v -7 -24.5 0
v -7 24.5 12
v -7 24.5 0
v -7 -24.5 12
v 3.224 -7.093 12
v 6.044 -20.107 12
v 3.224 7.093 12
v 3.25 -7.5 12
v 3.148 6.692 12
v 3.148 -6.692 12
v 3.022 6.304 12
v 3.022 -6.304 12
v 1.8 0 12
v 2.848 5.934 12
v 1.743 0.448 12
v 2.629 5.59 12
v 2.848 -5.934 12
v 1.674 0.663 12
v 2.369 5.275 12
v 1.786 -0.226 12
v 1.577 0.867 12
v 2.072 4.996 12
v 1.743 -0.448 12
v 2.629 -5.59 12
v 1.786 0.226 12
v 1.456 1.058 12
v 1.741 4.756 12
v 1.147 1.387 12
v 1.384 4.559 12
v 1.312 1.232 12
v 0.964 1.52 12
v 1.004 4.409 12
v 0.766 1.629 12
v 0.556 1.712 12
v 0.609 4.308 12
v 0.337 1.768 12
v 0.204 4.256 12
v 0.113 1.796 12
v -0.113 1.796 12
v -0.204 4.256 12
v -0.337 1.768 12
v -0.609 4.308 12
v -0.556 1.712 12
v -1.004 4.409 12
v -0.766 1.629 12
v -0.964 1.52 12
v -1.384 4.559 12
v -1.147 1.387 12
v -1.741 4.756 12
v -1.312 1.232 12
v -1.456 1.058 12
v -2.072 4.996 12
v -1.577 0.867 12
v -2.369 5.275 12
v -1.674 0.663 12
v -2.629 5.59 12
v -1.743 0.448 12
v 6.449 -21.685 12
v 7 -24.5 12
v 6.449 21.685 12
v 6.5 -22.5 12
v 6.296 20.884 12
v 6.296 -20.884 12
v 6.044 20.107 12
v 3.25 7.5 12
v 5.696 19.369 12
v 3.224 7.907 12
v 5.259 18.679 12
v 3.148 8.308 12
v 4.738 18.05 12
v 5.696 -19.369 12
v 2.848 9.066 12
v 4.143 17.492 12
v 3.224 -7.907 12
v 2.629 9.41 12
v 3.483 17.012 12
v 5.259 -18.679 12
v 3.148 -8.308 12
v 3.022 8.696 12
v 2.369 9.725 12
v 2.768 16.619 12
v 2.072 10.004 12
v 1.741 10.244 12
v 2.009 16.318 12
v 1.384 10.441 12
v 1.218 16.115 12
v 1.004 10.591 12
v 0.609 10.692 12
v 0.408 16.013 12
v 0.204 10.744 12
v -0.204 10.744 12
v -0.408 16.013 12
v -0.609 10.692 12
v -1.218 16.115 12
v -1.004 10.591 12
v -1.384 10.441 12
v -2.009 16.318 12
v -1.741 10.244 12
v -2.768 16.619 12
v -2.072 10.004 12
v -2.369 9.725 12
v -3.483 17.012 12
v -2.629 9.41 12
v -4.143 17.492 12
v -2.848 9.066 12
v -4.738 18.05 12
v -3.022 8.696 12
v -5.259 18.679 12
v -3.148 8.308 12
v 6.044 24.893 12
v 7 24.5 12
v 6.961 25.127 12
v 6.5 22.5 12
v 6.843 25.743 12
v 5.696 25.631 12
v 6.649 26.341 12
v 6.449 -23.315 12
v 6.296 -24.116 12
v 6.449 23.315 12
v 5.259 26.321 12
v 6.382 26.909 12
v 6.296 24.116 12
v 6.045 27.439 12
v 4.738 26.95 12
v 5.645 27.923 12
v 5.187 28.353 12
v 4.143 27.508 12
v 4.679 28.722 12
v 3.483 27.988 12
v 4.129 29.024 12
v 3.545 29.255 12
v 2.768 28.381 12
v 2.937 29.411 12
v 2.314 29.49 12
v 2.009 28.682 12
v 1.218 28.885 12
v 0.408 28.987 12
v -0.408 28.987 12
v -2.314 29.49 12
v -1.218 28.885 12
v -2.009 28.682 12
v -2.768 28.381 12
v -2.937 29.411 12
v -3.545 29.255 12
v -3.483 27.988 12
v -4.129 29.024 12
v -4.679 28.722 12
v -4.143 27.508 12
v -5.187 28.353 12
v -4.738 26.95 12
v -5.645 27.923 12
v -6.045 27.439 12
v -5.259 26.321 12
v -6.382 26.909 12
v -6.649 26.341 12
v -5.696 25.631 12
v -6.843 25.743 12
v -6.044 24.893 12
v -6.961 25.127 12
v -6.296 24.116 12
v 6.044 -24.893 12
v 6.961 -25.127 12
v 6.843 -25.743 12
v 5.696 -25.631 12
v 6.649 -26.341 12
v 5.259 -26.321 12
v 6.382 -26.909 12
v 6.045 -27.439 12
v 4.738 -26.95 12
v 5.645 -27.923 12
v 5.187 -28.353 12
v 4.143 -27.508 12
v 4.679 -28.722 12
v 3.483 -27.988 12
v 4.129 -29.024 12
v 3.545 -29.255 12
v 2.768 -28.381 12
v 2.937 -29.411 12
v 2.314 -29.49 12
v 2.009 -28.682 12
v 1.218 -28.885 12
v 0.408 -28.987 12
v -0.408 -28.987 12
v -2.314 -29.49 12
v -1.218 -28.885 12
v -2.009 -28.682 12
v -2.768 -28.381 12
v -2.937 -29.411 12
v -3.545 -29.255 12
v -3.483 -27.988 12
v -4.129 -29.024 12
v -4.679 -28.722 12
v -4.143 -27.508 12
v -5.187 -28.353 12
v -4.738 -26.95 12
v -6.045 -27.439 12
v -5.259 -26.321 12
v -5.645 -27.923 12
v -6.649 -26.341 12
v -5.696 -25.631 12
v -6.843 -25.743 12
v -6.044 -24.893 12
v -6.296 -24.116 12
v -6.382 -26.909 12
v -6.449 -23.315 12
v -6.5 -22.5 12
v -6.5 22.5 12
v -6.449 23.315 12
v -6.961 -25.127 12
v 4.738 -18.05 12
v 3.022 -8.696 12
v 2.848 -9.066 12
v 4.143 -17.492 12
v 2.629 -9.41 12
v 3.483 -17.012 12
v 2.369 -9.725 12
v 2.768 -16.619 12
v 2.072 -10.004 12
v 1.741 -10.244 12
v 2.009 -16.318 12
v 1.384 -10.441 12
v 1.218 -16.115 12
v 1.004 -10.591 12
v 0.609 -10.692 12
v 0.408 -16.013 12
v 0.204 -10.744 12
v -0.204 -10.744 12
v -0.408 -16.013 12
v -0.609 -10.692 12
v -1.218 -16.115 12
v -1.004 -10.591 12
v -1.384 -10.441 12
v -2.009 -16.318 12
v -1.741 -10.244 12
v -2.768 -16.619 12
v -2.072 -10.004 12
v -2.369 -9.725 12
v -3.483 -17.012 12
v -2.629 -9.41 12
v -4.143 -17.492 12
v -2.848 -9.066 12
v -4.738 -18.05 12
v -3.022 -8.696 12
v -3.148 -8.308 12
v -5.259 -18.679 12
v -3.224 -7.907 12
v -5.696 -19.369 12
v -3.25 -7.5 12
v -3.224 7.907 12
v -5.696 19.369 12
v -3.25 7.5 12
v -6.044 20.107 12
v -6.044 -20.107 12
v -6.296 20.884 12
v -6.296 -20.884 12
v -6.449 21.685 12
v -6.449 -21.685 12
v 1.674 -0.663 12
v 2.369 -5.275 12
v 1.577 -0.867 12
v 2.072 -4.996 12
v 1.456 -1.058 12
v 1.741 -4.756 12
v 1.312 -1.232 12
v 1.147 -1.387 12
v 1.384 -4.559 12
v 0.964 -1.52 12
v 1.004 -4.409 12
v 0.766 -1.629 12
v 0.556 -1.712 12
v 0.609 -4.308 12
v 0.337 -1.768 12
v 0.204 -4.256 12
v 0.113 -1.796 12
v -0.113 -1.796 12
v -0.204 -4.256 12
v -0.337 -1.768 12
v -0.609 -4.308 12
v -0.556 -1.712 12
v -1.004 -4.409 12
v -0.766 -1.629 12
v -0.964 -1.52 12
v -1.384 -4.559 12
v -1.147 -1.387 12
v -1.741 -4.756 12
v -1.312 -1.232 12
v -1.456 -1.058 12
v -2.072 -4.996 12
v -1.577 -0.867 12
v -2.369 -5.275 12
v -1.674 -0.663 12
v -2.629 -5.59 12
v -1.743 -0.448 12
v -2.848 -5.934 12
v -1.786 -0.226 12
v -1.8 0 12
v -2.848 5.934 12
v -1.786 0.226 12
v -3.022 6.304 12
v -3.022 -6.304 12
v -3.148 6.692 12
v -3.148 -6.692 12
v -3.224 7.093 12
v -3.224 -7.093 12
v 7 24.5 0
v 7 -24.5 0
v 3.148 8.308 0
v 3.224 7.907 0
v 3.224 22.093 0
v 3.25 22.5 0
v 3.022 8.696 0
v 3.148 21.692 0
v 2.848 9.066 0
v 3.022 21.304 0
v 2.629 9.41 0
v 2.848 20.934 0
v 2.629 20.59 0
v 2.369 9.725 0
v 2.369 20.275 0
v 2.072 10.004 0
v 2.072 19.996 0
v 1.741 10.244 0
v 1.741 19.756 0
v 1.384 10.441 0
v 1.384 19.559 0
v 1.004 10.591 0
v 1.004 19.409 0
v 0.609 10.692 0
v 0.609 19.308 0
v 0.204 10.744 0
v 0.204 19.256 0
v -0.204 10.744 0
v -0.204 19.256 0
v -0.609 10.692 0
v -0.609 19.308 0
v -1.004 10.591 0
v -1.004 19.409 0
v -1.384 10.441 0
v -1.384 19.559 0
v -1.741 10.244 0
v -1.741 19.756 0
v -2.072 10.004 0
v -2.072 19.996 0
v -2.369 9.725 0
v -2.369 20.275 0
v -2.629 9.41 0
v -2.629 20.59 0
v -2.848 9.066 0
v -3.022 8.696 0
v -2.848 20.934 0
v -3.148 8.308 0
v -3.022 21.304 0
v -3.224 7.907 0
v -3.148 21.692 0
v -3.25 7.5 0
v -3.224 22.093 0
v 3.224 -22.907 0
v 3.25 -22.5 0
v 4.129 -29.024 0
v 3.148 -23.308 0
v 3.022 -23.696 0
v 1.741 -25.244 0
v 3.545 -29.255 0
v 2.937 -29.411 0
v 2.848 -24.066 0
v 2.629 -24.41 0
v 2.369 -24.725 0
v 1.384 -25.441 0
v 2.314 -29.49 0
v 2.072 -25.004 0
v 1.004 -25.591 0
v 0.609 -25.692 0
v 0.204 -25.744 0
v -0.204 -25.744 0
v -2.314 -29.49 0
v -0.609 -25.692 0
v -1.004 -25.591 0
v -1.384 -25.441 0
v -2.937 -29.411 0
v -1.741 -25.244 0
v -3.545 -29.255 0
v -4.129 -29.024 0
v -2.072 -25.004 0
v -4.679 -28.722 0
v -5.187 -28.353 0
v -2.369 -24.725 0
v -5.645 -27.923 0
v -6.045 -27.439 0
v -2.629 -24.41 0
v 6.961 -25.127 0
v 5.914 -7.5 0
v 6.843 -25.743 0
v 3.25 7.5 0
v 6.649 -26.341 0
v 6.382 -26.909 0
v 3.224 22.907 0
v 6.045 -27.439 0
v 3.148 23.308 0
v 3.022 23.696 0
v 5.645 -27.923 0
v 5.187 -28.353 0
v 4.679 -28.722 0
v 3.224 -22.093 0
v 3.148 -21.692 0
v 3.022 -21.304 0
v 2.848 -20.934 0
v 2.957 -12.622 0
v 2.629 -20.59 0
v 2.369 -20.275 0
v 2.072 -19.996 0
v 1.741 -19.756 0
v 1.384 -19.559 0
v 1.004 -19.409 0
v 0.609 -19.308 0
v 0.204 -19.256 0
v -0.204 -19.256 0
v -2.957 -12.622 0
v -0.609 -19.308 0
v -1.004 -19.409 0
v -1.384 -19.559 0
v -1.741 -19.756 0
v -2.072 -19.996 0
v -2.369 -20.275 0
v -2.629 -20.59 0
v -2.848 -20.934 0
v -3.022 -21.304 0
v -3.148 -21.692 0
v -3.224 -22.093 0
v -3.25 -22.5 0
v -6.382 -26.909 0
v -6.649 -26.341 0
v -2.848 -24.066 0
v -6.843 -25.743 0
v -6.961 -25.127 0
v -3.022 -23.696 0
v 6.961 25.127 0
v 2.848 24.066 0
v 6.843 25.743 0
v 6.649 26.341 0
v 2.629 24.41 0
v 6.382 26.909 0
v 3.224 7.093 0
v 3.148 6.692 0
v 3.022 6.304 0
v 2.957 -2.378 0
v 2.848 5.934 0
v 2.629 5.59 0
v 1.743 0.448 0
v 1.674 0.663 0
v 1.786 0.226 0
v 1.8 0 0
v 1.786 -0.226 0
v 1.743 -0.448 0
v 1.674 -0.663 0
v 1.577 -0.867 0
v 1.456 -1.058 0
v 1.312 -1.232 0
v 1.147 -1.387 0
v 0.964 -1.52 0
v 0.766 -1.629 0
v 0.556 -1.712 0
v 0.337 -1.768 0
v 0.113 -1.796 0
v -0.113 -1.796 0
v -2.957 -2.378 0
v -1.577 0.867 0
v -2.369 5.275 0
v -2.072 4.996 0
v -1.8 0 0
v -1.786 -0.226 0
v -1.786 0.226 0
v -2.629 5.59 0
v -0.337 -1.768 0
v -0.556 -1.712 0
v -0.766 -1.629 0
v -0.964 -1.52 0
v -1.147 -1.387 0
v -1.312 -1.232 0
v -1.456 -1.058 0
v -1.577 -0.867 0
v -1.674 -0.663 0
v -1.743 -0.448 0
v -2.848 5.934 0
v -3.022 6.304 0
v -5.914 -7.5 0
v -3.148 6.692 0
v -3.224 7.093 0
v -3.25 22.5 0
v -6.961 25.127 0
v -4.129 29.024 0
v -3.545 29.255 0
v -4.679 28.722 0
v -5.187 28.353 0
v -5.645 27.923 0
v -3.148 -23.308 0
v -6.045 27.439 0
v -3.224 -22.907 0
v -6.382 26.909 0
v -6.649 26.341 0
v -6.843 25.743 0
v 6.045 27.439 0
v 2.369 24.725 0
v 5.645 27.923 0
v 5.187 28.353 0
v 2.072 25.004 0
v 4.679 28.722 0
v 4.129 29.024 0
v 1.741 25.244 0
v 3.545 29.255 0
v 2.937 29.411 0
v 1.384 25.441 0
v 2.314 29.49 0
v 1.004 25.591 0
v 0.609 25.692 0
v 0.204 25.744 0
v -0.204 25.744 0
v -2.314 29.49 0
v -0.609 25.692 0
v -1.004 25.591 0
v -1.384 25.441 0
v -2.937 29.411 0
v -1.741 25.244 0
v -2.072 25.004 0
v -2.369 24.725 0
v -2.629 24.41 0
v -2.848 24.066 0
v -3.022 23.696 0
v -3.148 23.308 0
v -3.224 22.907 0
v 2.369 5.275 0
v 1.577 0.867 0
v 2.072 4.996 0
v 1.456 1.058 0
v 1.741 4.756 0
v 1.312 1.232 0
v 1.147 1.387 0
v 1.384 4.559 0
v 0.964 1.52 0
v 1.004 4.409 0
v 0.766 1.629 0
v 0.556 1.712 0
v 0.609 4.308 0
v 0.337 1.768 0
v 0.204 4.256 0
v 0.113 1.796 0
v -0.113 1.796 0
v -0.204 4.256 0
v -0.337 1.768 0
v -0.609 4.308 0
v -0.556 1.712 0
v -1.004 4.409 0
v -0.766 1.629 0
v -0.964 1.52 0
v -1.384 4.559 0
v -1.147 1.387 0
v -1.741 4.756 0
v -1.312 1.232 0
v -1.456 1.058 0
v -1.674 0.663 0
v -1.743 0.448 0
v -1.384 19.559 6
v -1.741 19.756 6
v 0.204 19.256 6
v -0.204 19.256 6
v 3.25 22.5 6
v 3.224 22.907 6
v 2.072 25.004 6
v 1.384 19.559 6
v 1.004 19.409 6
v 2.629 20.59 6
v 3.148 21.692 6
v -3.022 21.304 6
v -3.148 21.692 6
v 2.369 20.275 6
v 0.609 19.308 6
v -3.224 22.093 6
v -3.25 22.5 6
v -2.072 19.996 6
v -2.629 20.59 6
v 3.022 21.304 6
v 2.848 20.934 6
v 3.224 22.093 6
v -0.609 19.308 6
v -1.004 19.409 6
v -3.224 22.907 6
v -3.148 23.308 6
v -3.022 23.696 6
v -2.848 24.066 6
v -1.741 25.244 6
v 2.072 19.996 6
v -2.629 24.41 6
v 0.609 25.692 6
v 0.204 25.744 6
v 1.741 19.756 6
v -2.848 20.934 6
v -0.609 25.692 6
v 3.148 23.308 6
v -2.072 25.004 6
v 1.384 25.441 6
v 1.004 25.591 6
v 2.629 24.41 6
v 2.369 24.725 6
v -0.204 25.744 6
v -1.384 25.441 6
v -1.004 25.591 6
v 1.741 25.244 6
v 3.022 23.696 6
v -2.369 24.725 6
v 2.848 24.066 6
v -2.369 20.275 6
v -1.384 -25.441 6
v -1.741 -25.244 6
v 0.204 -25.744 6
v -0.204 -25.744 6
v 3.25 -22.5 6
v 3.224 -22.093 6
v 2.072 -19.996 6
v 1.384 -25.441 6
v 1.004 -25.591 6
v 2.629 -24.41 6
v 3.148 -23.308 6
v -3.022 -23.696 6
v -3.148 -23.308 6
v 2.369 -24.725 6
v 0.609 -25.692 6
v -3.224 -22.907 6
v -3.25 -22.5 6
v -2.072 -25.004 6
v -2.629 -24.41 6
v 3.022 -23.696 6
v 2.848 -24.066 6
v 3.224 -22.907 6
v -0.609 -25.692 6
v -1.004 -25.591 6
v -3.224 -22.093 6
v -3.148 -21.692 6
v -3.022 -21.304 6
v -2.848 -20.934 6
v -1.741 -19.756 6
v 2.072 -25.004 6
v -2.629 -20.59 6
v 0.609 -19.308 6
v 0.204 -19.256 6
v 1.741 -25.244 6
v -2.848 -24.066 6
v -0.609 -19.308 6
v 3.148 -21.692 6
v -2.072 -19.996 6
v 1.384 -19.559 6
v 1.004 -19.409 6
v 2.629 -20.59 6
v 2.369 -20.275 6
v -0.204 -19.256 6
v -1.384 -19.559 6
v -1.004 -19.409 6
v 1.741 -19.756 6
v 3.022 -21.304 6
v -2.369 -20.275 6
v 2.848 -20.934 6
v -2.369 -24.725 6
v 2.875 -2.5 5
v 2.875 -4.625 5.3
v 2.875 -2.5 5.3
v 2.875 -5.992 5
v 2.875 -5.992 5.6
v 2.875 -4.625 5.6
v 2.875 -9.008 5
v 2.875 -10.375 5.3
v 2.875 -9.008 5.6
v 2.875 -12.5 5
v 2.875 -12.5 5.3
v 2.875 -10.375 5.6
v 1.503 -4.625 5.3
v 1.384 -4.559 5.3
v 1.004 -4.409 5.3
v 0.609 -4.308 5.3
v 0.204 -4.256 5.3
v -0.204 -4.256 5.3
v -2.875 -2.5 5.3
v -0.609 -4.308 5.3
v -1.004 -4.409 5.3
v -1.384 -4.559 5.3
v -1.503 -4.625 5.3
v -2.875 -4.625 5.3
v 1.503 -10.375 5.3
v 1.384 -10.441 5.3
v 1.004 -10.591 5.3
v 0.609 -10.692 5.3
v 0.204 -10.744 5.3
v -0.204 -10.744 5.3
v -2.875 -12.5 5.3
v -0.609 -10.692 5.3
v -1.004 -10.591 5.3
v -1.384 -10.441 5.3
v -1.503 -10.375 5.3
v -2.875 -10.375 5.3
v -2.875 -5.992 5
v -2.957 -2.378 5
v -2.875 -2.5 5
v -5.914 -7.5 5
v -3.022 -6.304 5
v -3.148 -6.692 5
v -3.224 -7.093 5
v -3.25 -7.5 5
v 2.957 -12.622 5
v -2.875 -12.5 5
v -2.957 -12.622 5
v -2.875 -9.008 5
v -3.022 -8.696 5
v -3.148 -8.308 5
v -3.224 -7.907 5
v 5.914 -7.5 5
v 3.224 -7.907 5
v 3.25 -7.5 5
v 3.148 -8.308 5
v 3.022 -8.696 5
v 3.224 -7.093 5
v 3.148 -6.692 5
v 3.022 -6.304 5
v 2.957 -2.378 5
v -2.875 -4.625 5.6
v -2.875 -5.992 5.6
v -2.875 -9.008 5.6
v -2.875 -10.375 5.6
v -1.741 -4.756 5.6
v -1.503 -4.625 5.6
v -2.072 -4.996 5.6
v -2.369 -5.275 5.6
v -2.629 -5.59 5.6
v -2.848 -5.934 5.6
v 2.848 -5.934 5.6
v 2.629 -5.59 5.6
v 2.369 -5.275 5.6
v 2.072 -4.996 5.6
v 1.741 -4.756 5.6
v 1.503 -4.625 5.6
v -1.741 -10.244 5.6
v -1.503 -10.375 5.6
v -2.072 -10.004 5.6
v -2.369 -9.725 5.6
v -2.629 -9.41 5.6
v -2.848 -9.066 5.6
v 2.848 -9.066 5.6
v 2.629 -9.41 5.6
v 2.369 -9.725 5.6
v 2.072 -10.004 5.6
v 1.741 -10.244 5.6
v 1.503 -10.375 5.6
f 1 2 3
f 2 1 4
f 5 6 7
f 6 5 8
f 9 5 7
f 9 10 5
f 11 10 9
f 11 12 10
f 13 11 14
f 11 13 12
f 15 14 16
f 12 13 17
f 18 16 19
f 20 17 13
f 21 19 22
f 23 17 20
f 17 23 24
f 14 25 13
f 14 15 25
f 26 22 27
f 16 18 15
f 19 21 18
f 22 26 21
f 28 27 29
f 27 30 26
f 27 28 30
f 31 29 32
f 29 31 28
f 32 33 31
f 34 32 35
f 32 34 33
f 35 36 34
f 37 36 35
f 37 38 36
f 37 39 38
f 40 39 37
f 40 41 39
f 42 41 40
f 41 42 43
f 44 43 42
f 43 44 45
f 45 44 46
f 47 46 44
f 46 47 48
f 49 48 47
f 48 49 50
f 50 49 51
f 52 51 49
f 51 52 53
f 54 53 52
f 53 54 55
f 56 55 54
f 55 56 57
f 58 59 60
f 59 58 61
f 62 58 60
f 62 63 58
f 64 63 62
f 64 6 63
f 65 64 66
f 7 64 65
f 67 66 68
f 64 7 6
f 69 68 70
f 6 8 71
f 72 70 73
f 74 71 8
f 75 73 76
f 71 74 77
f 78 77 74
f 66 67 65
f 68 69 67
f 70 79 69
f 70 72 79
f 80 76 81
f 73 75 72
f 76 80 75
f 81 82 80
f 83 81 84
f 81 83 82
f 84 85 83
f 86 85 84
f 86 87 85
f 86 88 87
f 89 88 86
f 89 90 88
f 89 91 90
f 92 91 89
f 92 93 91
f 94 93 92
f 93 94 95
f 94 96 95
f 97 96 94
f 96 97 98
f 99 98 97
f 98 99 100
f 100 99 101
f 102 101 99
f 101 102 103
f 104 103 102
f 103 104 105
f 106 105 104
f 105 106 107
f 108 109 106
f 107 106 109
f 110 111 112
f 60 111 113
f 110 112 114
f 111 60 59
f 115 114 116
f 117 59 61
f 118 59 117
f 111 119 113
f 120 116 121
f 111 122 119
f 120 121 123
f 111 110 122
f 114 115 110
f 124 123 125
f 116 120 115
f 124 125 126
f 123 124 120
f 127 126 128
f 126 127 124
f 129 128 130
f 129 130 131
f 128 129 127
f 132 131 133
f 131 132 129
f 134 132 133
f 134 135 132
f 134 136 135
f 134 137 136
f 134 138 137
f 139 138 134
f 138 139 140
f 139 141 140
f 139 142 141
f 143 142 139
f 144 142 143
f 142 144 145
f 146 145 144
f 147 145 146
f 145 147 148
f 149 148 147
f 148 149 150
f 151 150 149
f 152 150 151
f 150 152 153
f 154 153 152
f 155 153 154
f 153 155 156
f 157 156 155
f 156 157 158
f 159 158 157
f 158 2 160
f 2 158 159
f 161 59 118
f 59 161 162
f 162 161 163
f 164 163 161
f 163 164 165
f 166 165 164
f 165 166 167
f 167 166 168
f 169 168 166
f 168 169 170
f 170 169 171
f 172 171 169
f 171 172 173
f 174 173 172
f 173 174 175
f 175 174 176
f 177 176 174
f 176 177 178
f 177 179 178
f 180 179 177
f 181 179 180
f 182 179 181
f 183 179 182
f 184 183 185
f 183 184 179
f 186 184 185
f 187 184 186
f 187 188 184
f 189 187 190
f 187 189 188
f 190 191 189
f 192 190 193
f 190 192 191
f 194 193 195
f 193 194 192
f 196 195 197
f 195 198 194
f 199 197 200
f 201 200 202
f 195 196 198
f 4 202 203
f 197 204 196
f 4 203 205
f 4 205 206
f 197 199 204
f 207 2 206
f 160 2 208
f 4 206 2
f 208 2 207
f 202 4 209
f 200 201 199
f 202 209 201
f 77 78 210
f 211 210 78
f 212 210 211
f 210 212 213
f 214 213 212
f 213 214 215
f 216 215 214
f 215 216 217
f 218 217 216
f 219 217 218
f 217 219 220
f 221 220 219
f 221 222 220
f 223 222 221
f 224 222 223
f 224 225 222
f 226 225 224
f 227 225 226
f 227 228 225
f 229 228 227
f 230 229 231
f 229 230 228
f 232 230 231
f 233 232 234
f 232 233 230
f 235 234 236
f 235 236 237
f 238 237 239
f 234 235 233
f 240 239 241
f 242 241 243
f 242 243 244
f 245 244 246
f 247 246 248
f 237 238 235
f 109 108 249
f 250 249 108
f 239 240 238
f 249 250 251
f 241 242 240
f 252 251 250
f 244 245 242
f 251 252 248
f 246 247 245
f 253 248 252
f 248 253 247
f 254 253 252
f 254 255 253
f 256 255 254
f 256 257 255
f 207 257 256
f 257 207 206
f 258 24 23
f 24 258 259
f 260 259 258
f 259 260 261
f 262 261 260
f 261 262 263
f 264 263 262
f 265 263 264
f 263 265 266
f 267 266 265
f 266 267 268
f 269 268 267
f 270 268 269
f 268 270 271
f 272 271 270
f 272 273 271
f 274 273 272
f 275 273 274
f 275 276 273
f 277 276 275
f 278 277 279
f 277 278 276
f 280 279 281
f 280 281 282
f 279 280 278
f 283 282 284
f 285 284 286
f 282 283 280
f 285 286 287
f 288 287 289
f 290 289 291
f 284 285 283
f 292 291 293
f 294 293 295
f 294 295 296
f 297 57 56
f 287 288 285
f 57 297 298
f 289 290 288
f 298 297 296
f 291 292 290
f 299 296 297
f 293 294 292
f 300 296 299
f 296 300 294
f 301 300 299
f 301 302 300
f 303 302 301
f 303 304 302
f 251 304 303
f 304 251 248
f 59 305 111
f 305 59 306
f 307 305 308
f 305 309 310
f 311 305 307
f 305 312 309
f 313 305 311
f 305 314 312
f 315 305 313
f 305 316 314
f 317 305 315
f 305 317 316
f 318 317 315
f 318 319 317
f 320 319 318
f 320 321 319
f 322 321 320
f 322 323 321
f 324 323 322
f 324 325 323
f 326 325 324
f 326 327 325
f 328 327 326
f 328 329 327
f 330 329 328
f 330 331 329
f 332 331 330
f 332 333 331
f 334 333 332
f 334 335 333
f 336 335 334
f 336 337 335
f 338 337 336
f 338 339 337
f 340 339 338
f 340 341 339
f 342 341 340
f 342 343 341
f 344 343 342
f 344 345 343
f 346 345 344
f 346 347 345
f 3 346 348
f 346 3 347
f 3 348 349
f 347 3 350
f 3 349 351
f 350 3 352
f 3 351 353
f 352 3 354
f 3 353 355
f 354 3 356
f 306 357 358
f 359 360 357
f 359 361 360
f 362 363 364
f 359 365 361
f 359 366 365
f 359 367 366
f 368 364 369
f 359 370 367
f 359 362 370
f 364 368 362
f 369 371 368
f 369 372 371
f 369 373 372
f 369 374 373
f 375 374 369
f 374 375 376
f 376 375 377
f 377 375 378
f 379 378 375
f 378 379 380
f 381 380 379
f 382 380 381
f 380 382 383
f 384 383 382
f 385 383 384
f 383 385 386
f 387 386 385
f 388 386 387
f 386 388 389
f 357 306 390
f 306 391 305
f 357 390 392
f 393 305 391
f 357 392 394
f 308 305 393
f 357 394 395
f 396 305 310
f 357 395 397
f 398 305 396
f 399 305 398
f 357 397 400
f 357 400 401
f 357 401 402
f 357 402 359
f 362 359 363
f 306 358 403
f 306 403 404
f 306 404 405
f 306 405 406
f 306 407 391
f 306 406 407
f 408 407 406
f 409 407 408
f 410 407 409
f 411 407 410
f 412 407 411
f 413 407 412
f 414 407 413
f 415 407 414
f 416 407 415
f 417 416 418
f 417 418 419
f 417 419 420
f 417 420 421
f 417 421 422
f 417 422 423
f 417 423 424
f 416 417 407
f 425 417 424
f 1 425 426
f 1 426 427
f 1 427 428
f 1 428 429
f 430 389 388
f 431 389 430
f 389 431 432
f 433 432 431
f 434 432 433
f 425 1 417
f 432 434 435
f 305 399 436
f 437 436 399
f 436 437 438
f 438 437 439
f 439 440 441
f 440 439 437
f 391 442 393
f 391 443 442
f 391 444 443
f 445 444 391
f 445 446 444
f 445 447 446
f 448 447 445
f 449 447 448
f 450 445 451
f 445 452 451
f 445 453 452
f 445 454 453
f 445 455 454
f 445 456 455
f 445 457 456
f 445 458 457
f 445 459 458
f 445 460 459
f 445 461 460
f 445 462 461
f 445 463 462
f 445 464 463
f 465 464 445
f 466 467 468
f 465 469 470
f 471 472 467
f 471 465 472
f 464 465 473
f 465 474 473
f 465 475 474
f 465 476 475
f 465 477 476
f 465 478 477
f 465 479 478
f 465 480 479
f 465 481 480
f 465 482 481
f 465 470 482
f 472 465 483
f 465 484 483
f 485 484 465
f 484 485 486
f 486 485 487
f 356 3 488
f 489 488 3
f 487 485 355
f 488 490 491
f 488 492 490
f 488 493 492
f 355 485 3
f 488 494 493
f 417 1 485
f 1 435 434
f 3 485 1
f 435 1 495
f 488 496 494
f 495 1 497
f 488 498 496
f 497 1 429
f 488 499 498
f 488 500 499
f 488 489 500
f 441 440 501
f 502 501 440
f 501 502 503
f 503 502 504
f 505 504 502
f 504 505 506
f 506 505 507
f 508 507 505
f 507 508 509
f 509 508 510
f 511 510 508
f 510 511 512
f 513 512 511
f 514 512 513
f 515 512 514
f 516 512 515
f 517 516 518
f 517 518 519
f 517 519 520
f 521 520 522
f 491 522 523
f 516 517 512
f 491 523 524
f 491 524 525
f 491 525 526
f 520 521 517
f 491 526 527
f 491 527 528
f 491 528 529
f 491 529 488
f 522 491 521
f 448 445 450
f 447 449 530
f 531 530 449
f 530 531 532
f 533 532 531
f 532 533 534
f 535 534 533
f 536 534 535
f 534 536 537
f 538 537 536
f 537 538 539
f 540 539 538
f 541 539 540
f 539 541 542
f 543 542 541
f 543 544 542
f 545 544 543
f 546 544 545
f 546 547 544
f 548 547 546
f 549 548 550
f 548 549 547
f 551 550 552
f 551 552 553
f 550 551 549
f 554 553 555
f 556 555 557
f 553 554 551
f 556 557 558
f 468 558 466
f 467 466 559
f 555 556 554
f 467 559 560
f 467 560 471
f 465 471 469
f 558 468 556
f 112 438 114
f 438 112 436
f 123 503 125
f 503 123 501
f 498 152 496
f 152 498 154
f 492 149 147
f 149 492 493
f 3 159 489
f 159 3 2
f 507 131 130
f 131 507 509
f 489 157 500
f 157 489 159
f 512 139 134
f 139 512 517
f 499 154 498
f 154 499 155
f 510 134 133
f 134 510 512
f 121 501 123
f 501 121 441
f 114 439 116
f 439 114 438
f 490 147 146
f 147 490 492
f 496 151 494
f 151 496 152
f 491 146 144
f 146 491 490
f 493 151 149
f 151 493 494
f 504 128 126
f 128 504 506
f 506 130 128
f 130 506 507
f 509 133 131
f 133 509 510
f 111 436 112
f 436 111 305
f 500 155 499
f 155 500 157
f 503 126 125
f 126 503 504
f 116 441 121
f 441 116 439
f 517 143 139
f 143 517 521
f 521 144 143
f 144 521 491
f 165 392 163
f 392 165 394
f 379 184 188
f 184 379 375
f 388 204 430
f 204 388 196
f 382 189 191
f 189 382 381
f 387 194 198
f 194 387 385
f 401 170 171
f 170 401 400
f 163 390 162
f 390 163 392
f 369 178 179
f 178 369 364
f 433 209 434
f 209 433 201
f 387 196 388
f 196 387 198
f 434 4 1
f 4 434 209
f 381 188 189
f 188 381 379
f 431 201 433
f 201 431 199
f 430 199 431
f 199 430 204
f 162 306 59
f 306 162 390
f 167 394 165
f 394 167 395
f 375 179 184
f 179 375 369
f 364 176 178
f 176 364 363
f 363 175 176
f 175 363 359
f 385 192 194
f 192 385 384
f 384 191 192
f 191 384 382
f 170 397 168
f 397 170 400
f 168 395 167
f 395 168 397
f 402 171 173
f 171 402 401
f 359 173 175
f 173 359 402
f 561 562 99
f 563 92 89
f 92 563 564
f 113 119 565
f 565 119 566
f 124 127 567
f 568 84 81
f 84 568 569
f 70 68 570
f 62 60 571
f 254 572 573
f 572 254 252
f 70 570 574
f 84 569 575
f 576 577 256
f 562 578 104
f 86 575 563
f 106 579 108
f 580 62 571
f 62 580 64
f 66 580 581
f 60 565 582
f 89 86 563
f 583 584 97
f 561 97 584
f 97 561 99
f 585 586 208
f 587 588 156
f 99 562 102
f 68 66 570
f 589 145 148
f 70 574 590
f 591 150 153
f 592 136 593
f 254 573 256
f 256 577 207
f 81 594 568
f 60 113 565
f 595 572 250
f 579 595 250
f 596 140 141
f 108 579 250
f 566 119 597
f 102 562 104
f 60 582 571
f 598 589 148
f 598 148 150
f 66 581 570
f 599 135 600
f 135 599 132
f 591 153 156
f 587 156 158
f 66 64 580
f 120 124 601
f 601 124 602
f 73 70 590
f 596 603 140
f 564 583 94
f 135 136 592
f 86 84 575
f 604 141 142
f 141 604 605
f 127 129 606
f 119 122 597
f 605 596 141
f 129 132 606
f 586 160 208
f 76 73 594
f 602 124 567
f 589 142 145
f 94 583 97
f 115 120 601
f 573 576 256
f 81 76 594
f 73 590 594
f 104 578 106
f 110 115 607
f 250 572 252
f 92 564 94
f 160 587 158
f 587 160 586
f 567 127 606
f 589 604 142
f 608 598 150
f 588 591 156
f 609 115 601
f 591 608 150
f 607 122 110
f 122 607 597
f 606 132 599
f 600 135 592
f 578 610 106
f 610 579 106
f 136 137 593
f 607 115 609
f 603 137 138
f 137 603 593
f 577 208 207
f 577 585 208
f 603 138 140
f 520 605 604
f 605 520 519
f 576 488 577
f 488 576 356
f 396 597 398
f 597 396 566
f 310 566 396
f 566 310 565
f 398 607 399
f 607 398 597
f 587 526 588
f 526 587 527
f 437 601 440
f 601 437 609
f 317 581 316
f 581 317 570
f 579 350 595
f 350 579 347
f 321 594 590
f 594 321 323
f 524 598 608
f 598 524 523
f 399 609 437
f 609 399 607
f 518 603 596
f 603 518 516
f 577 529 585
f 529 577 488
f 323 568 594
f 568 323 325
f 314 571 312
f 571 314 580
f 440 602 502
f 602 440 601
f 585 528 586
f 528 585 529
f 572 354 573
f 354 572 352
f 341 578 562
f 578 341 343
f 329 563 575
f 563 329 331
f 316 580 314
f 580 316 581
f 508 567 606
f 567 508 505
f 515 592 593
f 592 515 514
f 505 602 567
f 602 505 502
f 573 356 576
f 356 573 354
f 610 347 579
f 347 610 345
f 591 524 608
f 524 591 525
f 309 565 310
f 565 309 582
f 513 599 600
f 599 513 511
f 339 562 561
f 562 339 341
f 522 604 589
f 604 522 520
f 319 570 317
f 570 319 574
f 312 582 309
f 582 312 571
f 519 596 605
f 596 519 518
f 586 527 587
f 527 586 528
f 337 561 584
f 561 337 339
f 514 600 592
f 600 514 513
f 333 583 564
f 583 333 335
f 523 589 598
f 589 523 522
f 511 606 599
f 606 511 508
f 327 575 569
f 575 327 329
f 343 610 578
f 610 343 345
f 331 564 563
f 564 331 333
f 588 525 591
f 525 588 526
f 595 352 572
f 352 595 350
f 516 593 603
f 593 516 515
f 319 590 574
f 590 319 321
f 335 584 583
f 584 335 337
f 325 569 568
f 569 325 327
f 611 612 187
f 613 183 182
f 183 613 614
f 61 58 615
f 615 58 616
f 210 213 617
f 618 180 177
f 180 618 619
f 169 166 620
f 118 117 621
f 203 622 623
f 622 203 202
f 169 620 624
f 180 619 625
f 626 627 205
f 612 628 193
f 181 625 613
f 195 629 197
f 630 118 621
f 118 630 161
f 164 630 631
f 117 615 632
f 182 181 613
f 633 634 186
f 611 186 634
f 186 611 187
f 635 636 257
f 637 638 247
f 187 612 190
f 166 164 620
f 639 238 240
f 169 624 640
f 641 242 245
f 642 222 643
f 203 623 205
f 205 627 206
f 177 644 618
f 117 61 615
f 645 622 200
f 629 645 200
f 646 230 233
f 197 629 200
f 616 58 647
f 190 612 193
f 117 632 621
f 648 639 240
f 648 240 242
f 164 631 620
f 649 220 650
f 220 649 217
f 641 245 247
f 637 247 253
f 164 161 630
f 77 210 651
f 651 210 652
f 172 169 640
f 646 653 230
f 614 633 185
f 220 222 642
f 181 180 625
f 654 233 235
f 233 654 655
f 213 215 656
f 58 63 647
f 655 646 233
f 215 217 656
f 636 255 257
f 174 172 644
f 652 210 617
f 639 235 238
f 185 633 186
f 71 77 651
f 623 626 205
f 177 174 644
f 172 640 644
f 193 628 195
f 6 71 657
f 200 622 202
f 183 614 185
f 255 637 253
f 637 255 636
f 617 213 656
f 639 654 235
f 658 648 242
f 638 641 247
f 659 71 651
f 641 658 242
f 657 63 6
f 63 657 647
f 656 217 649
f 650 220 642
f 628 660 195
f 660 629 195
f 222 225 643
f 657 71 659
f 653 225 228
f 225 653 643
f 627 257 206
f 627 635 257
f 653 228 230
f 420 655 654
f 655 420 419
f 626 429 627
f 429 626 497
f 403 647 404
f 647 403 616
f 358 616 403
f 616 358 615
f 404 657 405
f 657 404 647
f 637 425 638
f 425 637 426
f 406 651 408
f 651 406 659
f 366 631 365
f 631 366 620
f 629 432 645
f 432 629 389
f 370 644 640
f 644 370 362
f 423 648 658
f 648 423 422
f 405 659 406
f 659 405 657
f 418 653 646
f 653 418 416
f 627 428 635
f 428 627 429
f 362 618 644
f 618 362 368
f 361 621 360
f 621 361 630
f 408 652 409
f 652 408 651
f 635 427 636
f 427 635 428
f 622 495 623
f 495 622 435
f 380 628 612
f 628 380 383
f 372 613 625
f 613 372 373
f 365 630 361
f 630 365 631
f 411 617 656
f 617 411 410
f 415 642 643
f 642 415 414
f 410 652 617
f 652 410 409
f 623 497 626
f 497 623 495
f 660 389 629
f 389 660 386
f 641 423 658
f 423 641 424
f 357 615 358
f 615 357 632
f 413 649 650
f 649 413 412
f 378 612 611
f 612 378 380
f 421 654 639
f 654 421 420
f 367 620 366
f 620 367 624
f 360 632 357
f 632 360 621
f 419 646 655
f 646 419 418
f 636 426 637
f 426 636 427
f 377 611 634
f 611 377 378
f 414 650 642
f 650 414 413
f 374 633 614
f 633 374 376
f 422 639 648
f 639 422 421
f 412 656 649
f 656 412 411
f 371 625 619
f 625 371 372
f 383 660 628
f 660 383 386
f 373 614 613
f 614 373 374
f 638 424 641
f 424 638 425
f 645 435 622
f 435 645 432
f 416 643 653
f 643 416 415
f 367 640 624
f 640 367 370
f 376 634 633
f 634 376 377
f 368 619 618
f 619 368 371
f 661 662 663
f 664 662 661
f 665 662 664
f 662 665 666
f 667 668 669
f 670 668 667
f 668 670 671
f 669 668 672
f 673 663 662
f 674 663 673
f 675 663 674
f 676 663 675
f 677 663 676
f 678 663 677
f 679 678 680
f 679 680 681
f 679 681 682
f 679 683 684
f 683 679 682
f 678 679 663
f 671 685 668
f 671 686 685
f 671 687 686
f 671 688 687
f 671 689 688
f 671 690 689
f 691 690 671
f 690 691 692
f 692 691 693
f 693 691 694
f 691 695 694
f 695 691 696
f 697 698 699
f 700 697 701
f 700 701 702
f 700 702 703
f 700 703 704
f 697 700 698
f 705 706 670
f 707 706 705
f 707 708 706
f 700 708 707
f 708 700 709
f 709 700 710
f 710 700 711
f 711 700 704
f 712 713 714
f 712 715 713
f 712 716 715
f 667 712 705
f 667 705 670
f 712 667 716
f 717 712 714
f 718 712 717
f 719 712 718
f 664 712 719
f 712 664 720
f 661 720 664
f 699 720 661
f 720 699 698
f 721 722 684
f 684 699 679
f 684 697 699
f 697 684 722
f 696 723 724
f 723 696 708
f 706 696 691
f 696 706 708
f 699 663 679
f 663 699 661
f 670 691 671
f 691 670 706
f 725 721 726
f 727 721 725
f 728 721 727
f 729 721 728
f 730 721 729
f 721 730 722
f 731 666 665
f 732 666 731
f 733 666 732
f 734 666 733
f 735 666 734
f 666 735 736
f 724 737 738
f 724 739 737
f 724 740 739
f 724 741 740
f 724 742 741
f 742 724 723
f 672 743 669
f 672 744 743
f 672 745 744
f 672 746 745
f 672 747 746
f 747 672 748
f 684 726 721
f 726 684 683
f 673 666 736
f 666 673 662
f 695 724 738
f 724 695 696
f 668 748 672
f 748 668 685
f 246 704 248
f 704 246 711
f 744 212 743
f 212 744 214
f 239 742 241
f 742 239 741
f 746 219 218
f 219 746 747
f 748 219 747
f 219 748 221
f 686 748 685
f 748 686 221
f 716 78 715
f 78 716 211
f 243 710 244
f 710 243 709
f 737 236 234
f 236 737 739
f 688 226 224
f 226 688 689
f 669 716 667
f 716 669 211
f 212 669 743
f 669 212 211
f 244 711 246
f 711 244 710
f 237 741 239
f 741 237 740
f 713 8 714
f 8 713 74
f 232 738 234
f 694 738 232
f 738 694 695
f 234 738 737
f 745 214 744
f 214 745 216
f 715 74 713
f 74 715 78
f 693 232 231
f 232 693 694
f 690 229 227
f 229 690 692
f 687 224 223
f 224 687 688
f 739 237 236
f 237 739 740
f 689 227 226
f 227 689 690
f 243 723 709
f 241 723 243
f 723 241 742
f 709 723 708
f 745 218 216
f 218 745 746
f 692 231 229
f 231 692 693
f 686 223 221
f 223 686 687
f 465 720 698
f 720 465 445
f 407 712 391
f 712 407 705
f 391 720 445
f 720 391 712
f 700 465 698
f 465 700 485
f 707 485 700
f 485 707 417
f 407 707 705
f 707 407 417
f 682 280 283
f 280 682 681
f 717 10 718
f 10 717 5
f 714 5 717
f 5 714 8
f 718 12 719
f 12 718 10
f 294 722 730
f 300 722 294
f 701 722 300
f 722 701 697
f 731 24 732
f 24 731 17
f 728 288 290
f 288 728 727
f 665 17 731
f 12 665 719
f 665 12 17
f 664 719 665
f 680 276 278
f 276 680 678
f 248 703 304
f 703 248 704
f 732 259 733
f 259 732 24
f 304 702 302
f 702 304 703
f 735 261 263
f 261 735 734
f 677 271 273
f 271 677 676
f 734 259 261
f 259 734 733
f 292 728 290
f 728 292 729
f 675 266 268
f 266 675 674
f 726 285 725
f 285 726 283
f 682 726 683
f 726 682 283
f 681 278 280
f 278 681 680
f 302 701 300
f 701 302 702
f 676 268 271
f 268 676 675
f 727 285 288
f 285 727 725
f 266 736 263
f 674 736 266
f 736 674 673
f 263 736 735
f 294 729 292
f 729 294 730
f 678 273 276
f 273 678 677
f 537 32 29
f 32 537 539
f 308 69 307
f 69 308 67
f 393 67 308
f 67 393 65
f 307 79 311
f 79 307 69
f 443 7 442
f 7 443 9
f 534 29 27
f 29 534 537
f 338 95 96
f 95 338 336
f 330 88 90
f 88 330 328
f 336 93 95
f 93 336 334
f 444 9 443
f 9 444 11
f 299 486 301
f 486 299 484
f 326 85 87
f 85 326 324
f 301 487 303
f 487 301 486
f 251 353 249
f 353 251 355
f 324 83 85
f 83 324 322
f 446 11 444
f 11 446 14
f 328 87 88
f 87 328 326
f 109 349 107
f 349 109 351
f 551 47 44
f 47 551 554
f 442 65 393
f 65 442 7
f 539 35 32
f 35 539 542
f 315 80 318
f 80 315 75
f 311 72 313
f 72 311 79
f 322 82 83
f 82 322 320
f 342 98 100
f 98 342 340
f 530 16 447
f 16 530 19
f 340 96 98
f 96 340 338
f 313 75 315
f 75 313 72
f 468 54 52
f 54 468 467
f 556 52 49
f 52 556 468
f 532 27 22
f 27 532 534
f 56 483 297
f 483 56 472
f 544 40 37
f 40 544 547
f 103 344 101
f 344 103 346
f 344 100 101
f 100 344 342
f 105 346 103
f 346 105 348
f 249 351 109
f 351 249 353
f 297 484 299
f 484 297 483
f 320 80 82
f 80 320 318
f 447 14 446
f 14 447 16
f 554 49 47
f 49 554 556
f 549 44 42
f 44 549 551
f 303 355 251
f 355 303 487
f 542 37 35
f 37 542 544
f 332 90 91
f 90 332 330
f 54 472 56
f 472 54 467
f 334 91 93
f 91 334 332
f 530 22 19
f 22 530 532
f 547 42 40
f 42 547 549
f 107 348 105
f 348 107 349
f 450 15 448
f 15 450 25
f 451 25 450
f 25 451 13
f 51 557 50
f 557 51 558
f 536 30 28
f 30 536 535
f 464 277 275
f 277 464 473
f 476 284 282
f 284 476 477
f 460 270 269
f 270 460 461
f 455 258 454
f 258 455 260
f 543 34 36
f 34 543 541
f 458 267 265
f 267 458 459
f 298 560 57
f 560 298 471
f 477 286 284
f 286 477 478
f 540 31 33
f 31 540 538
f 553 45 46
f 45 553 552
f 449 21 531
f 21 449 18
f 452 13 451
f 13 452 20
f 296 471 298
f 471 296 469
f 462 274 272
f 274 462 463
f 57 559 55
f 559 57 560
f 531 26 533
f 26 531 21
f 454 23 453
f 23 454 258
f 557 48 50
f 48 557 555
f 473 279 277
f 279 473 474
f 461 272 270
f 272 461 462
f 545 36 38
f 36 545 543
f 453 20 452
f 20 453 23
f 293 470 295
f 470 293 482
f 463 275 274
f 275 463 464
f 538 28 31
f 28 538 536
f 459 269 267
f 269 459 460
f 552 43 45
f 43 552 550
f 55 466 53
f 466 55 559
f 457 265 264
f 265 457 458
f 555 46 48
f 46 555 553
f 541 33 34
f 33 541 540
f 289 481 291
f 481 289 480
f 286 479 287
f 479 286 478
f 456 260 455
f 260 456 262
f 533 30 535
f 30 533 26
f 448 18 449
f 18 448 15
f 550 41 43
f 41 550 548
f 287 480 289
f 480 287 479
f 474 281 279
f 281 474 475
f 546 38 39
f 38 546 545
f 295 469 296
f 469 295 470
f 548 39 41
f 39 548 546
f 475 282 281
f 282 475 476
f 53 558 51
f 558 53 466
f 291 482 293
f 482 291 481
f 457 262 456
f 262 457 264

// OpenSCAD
$fn = 50;


difference() {
	union() {
		hull() {
			translate(v = [-2.0000000000, 9.5000000000, 0]) {
				cylinder(h = 12, r = 5);
			}
			translate(v = [2.0000000000, 9.5000000000, 0]) {
				cylinder(h = 12, r = 5);
			}
			translate(v = [-2.0000000000, -9.5000000000, 0]) {
				cylinder(h = 12, r = 5);
			}
			translate(v = [2.0000000000, -9.5000000000, 0]) {
				cylinder(h = 12, r = 5);
			}
		}
		translate(v = [0.0000000000, 15.0000000000, 0]) {
			hull() {
				translate(v = [-2.0000000000, 9.5000000000, 0]) {
					cylinder(h = 12, r = 5);
				}
				translate(v = [2.0000000000, 9.5000000000, 0]) {
					cylinder(h = 12, r = 5);
				}
				translate(v = [-2.0000000000, -9.5000000000, 0]) {
					cylinder(h = 12, r = 5);
				}
				translate(v = [2.0000000000, -9.5000000000, 0]) {
					cylinder(h = 12, r = 5);
				}
			}
		}
		translate(v = [0.0000000000, 15.0000000000, 0]) {
			hull() {
				translate(v = [-2.0000000000, 9.5000000000, 0]) {
					cylinder(h = 12, r = 5);
				}
				translate(v = [2.0000000000, 9.5000000000, 0]) {
					cylinder(h = 12, r = 5);
				}
				translate(v = [-2.0000000000, -9.5000000000, 0]) {
					cylinder(h = 12, r = 5);
				}
				translate(v = [2.0000000000, -9.5000000000, 0]) {
					cylinder(h = 12, r = 5);
				}
			}
		}
		translate(v = [0.0000000000, -15.0000000000, 0]) {
			hull() {
				translate(v = [-2.0000000000, 9.5000000000, 0]) {
					cylinder(h = 12, r = 5);
				}
				translate(v = [2.0000000000, 9.5000000000, 0]) {
					cylinder(h = 12, r = 5);
				}
				translate(v = [-2.0000000000, -9.5000000000, 0]) {
					cylinder(h = 12, r = 5);
				}
				translate(v = [2.0000000000, -9.5000000000, 0]) {
					cylinder(h = 12, r = 5);
				}
			}
		}
		translate(v = [0.0000000000, -15.0000000000, 0]) {
			hull() {
				translate(v = [-2.0000000000, 9.5000000000, 0]) {
					cylinder(h = 12, r = 5);
				}
				translate(v = [2.0000000000, 9.5000000000, 0]) {
					cylinder(h = 12, r = 5);
				}
				translate(v = [-2.0000000000, -9.5000000000, 0]) {
					cylinder(h = 12, r = 5);
				}
				translate(v = [2.0000000000, -9.5000000000, 0]) {
					cylinder(h = 12, r = 5);
				}
			}
		}
	}
	union() {
		translate(v = [0.0000000000, 22.5000000000, 12]) {
			rotate(a = [0, 0, 0]) {
				difference() {
					union() {
						#translate(v = [0, 0, -12.0000000000]) {
							cylinder(h = 12, r = 2.2500000000);
						}
						#translate(v = [0, 0, -6]) {
							cylinder(h = 6, r1 = 3.2500000000, r2 = 6.5000000000);
						}
						#translate(v = [0, 0, -12.0000000000]) {
							cylinder(h = 12, r = 3.2500000000);
						}
						#translate(v = [0, 0, -12.0000000000]) {
							cylinder(h = 12, r = 2.2500000000);
						}
					}
					union();
				}
			}
		}
		translate(v = [0.0000000000, 22.5000000000, 12]) {
			rotate(a = [0, 0, 0]) {
				difference() {
					union() {
						#translate(v = [0, 0, -12.0000000000]) {
							cylinder(h = 12, r = 2.2500000000);
						}
						#translate(v = [0, 0, -6]) {
							cylinder(h = 6, r1 = 3.2500000000, r2 = 6.5000000000);
						}
						#translate(v = [0, 0, -12.0000000000]) {
							cylinder(h = 12, r = 3.2500000000);
						}
						#translate(v = [0, 0, -12.0000000000]) {
							cylinder(h = 12, r = 2.2500000000);
						}
					}
					union();
				}
			}
		}
		translate(v = [0.0000000000, -22.5000000000, 12]) {
			rotate(a = [0, 0, 0]) {
				difference() {
					union() {
						#translate(v = [0, 0, -12.0000000000]) {
							cylinder(h = 12, r = 2.2500000000);
						}
						#translate(v = [0, 0, -6]) {
							cylinder(h = 6, r1 = 3.2500000000, r2 = 6.5000000000);
						}
						#translate(v = [0, 0, -12.0000000000]) {
							cylinder(h = 12, r = 3.2500000000);
						}
						#translate(v = [0, 0, -12.0000000000]) {
							cylinder(h = 12, r = 2.2500000000);
						}
					}
					union();
				}
			}
		}
		translate(v = [0.0000000000, -22.5000000000, 12]) {
			rotate(a = [0, 0, 0]) {
				difference() {
					union() {
						#translate(v = [0, 0, -12.0000000000]) {
							cylinder(h = 12, r = 2.2500000000);
						}
						#translate(v = [0, 0, -6]) {
							cylinder(h = 6, r1 = 3.2500000000, r2 = 6.5000000000);
						}
						#translate(v = [0, 0, -12.0000000000]) {
							cylinder(h = 12, r = 3.2500000000);
						}
						#translate(v = [0, 0, -12.0000000000]) {
							cylinder(h = 12, r = 2.2500000000);
						}
					}
					union();
				}
			}
		}
		translate(v = [0.0000000000, -7.5000000000, 0]) {
			rotate(a = [0, 0, 0]) {
				difference() {
					union() {
						#translate(v = [-2.8750000000, -5.0000000000, -0.3000000000]) {
							cube(size = [5.7500000000, 10, 0.3000000000]);
						}
						#translate(v = [-2.8750000000, -2.8750000000, -0.6000000000]) {
							cube(size = [5.7500000000, 5.7500000000, 0.3000000000]);
						}
						#translate(v = [-2.8750000000, -5.0000000000, 5]) {
							cube(size = [5.7500000000, 10, 0.3000000000]);
						}
						#translate(v = [-2.8750000000, -2.8750000000, 5.3000000000]) {
							cube(size = [5.7500000000, 5.7500000000, 0.3000000000]);
						}
						#translate(v = [0, 0, -100.0000000000]) {
							cylinder(h = 200, r = 3.2500000000);
						}
						#linear_extrude(height = 5) {
							polygon(points = [[5.9142500000, 0.0000000000], [2.9571250000, 5.1218907443], [-2.9571250000, 5.1218907443], [-5.9142500000, 0.0000000000], [-2.9571250000, -5.1218907443], [2.9571250000, -5.1218907443]]);
						}
						#translate(v = [-2.8750000000, -5.0000000000, -0.3000000000]) {
							cube(size = [5.7500000000, 10, 0.3000000000]);
						}
						#translate(v = [-2.8750000000, -2.8750000000, -0.6000000000]) {
							cube(size = [5.7500000000, 5.7500000000, 0.3000000000]);
						}
						#translate(v = [-2.8750000000, -5.0000000000, 5]) {
							cube(size = [5.7500000000, 10, 0.3000000000]);
						}
						#translate(v = [-2.8750000000, -2.8750000000, 5.3000000000]) {
							cube(size = [5.7500000000, 5.7500000000, 0.3000000000]);
						}
						#translate(v = [0, 0, -100.0000000000]) {
							cylinder(h = 200, r = 3.2500000000);
						}
						#translate(v = [-2.8750000000, -5.0000000000, -0.3000000000]) {
							cube(size = [5.7500000000, 10, 0.3000000000]);
						}
						#translate(v = [-2.8750000000, -2.8750000000, -0.6000000000]) {
							cube(size = [5.7500000000, 5.7500000000, 0.3000000000]);
						}
						#translate(v = [-2.8750000000, -5.0000000000, 5]) {
							cube(size = [5.7500000000, 10, 0.3000000000]);
						}
						#translate(v = [-2.8750000000, -2.8750000000, 5.3000000000]) {
							cube(size = [5.7500000000, 5.7500000000, 0.3000000000]);
						}
						#translate(v = [0, 0, -100.0000000000]) {
							cylinder(h = 200, r = 3.2500000000);
						}
					}
					union();
				}
			}
		}
		translate(v = [0.0000000000, -7.5000000000, 0]) {
			translate(v = [0, 0, -100]) {
				cylinder(h = 200, r = 3.2500000000);
			}
		}
		translate(v = [0.0000000000, 7.5000000000, 0]) {
			translate(v = [0, 0, -100]) {
				cylinder(h = 200, r = 3.2500000000);
			}
		}
		translate(v = [0.0000000000, -7.5000000000, 0]) {
			translate(v = [0, 0, -100]) {
				cylinder(h = 200, r = 1.8000000000);
			}
		}
		translate(v = [0, 0, -100]) {
			cylinder(h = 200, r = 1.8000000000);
		}
		translate(v = [0.0000000000, 7.5000000000, 0]) {
			translate(v = [0, 0, -100]) {
				cylinder(h = 200, r = 1.8000000000);
			}
		}
	}
}
